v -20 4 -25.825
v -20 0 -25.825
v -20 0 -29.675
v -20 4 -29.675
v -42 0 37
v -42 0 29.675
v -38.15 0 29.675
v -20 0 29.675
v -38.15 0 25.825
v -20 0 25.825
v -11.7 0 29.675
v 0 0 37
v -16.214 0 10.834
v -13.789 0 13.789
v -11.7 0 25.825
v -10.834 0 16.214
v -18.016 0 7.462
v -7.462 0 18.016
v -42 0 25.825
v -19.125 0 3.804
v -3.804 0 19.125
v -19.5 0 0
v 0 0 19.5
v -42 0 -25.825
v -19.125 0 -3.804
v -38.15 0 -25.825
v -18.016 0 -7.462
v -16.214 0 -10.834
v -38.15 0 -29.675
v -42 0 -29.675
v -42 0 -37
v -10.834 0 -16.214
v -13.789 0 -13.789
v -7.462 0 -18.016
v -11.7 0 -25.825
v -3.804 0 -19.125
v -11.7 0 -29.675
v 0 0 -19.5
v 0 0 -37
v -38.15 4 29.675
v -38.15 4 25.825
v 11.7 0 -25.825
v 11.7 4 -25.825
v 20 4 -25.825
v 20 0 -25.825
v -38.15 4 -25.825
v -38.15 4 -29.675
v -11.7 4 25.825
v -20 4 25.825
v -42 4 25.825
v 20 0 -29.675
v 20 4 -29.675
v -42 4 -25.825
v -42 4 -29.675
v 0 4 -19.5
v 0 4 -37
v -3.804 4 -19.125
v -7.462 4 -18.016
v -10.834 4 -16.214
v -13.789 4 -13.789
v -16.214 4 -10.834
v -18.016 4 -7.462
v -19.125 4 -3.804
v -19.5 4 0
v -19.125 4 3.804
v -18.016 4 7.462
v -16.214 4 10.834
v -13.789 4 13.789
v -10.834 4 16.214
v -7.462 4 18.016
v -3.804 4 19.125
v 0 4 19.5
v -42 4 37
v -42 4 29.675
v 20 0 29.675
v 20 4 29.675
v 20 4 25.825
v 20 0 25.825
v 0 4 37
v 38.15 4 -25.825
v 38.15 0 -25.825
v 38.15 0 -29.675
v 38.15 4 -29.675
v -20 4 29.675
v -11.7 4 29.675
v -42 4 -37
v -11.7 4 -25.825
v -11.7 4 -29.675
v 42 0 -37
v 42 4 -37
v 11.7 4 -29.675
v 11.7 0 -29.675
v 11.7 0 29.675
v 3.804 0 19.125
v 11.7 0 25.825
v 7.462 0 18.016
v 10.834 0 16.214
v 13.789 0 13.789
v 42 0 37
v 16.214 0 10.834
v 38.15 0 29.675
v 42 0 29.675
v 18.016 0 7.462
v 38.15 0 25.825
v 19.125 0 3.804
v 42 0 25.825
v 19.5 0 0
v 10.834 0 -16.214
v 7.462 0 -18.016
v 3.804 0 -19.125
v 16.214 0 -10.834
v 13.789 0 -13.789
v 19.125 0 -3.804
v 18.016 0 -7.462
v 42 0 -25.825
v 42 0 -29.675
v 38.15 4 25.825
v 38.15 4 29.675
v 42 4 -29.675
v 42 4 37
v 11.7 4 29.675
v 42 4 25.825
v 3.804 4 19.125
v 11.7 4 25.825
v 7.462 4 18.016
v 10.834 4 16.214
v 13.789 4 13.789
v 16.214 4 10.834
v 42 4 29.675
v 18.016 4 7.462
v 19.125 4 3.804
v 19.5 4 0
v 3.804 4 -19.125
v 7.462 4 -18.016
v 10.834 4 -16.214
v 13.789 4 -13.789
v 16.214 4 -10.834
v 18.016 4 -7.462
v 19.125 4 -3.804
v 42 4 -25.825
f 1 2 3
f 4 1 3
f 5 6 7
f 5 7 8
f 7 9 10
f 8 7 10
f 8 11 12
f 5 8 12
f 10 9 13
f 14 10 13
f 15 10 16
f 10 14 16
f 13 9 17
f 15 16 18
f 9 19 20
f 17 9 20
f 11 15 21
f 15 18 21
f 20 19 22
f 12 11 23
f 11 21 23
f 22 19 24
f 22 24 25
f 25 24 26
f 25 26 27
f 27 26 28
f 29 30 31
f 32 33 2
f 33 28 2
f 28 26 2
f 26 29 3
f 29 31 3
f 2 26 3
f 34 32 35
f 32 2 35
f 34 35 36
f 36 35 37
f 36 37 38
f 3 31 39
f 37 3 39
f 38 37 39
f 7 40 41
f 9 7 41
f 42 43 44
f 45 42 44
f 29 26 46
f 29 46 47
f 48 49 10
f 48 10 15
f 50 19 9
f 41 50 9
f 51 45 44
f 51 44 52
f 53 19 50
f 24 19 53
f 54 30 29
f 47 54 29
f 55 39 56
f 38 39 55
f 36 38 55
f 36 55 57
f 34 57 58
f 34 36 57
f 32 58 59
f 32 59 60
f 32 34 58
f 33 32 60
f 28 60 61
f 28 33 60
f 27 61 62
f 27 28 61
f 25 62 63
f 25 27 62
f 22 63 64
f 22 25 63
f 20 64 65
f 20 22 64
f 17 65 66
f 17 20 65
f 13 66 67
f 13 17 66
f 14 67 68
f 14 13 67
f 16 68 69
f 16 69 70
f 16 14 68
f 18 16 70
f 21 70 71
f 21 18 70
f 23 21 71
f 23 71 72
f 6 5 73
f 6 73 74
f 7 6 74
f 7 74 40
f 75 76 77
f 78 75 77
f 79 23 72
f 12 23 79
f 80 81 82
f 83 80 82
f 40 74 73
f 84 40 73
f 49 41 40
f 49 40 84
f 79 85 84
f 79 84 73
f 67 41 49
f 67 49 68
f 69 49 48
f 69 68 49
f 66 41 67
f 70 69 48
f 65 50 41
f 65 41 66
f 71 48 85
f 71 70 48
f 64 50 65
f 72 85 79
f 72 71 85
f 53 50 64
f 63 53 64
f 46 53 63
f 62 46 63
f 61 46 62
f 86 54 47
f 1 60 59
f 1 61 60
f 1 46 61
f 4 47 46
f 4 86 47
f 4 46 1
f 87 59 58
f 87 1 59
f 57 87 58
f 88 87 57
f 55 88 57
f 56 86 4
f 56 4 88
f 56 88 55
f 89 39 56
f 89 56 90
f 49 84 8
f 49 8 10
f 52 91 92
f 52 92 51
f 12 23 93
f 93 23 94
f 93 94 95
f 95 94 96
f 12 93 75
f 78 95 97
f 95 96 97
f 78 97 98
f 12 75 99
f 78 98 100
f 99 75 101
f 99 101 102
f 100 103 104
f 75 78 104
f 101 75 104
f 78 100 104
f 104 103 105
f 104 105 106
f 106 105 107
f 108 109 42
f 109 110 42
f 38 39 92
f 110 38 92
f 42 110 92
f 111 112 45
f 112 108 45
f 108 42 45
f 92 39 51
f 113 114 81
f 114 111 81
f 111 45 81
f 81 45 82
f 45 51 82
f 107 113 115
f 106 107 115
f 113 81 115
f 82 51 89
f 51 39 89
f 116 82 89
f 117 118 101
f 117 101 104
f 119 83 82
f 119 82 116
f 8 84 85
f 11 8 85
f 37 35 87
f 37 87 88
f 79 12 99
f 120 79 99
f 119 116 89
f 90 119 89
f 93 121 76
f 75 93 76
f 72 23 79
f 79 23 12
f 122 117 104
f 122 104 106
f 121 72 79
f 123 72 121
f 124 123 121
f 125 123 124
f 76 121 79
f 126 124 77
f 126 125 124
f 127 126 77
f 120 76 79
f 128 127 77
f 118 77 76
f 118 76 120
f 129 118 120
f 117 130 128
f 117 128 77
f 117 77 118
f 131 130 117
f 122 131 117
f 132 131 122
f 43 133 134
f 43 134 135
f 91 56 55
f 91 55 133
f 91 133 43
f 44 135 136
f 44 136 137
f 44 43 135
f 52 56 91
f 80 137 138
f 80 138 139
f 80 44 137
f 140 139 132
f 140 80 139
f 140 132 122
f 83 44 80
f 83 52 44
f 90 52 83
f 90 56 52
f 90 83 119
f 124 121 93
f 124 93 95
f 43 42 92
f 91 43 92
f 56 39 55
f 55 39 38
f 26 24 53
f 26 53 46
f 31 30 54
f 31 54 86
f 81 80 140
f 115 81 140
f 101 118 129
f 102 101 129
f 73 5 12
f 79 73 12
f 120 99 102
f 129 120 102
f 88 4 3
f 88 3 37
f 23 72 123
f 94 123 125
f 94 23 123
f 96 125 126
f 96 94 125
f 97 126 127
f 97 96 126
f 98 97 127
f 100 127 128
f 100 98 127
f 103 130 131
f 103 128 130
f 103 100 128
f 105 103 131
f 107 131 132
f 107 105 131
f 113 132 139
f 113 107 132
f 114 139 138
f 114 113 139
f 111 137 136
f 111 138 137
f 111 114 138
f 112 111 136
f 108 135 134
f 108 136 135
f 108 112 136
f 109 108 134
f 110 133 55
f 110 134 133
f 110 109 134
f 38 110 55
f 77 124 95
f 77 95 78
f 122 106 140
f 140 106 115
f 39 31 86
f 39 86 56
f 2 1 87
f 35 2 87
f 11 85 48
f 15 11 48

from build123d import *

# Parameters (mm, degrees)
SKETCH2_W               = 84
SKETCH2_H               = 74
SKETCH2_R               = 19.5
BOSS_EXTRUDE1_DEPTH     = 4
SKETCH4_W               = 8.3
SKETCH4_H               = 3.85
SKETCH4_W_2             = 3.85
CUT_EXTRUDE2_DEPTH      = 1
CUT_EXTRUDE2_DEPTH_BACK = 5


with BuildPart() as part:
    # Sketch2 → Boss-Extrude1 (new body)
    with BuildSketch(Plane(origin=(0, 0, 0), x_dir=(1, 0, 0), z_dir=(0, 1, 0))):
        Rectangle(SKETCH2_W, SKETCH2_H)
        Circle(SKETCH2_R, mode=Mode.SUBTRACT)
    extrude(amount=BOSS_EXTRUDE1_DEPTH)


with BuildPart() as body_2:
    # Split1: the piece on the far side of the plane
    add(part.part)
    split(bisect_by=Plane(origin=(0, 0, 0), x_dir=(0, 0, 1), z_dir=(1, 0, 0)), keep=Keep.BOTTOM)


with BuildPart() as part_1:
    add(part.part)

    # Split1
    split(bisect_by=Plane(origin=(0, 0, 0), x_dir=(0, 0, 1), z_dir=(1, 0, 0)), keep=Keep.TOP)


with BuildPart() as cut_extrude2_tool:
    # Sketch4 → Cut-Extrude2 (new body, two sides)
    with BuildSketch(Plane(origin=(0, 4, 0), x_dir=(1, 0, 0), z_dir=(0, 1, 0))) as cut_extrude2_sk:
        with Locations((-15.85, -27.75)):
            Rectangle(SKETCH4_W, SKETCH4_H)
        with Locations((-40.075, -27.75)):
            Rectangle(SKETCH4_W_2, SKETCH4_H)
        with Locations((40.075, -27.75)):
            Rectangle(SKETCH4_W_2, SKETCH4_H)
        with Locations((15.85, -27.75)):
            Rectangle(SKETCH4_W, SKETCH4_H)
        with Locations((15.85, 27.75)):
            Rectangle(SKETCH4_W, SKETCH4_H)
        with Locations((40.075, 27.75)):
            Rectangle(SKETCH4_W_2, SKETCH4_H)
        with Locations((-40.075, 27.75)):
            Rectangle(SKETCH4_W_2, SKETCH4_H)
        with Locations((-15.85, 27.75)):
            Rectangle(SKETCH4_W, SKETCH4_H)
    extrude(amount=CUT_EXTRUDE2_DEPTH)
    extrude(cut_extrude2_sk.sketch, amount=-CUT_EXTRUDE2_DEPTH_BACK)


with BuildPart() as part_2:
    add(part_1.part)

    # Cut-Extrude2: cut by cut_extrude2_tool
    add(cut_extrude2_tool.part, mode=Mode.SUBTRACT)


with BuildPart() as body_2_1:
    add(body_2.part)

    # Cut-Extrude2: cut by cut_extrude2_tool
    add(cut_extrude2_tool.part, mode=Mode.SUBTRACT)


solid = Compound([part_2.part, body_2_1.part])
